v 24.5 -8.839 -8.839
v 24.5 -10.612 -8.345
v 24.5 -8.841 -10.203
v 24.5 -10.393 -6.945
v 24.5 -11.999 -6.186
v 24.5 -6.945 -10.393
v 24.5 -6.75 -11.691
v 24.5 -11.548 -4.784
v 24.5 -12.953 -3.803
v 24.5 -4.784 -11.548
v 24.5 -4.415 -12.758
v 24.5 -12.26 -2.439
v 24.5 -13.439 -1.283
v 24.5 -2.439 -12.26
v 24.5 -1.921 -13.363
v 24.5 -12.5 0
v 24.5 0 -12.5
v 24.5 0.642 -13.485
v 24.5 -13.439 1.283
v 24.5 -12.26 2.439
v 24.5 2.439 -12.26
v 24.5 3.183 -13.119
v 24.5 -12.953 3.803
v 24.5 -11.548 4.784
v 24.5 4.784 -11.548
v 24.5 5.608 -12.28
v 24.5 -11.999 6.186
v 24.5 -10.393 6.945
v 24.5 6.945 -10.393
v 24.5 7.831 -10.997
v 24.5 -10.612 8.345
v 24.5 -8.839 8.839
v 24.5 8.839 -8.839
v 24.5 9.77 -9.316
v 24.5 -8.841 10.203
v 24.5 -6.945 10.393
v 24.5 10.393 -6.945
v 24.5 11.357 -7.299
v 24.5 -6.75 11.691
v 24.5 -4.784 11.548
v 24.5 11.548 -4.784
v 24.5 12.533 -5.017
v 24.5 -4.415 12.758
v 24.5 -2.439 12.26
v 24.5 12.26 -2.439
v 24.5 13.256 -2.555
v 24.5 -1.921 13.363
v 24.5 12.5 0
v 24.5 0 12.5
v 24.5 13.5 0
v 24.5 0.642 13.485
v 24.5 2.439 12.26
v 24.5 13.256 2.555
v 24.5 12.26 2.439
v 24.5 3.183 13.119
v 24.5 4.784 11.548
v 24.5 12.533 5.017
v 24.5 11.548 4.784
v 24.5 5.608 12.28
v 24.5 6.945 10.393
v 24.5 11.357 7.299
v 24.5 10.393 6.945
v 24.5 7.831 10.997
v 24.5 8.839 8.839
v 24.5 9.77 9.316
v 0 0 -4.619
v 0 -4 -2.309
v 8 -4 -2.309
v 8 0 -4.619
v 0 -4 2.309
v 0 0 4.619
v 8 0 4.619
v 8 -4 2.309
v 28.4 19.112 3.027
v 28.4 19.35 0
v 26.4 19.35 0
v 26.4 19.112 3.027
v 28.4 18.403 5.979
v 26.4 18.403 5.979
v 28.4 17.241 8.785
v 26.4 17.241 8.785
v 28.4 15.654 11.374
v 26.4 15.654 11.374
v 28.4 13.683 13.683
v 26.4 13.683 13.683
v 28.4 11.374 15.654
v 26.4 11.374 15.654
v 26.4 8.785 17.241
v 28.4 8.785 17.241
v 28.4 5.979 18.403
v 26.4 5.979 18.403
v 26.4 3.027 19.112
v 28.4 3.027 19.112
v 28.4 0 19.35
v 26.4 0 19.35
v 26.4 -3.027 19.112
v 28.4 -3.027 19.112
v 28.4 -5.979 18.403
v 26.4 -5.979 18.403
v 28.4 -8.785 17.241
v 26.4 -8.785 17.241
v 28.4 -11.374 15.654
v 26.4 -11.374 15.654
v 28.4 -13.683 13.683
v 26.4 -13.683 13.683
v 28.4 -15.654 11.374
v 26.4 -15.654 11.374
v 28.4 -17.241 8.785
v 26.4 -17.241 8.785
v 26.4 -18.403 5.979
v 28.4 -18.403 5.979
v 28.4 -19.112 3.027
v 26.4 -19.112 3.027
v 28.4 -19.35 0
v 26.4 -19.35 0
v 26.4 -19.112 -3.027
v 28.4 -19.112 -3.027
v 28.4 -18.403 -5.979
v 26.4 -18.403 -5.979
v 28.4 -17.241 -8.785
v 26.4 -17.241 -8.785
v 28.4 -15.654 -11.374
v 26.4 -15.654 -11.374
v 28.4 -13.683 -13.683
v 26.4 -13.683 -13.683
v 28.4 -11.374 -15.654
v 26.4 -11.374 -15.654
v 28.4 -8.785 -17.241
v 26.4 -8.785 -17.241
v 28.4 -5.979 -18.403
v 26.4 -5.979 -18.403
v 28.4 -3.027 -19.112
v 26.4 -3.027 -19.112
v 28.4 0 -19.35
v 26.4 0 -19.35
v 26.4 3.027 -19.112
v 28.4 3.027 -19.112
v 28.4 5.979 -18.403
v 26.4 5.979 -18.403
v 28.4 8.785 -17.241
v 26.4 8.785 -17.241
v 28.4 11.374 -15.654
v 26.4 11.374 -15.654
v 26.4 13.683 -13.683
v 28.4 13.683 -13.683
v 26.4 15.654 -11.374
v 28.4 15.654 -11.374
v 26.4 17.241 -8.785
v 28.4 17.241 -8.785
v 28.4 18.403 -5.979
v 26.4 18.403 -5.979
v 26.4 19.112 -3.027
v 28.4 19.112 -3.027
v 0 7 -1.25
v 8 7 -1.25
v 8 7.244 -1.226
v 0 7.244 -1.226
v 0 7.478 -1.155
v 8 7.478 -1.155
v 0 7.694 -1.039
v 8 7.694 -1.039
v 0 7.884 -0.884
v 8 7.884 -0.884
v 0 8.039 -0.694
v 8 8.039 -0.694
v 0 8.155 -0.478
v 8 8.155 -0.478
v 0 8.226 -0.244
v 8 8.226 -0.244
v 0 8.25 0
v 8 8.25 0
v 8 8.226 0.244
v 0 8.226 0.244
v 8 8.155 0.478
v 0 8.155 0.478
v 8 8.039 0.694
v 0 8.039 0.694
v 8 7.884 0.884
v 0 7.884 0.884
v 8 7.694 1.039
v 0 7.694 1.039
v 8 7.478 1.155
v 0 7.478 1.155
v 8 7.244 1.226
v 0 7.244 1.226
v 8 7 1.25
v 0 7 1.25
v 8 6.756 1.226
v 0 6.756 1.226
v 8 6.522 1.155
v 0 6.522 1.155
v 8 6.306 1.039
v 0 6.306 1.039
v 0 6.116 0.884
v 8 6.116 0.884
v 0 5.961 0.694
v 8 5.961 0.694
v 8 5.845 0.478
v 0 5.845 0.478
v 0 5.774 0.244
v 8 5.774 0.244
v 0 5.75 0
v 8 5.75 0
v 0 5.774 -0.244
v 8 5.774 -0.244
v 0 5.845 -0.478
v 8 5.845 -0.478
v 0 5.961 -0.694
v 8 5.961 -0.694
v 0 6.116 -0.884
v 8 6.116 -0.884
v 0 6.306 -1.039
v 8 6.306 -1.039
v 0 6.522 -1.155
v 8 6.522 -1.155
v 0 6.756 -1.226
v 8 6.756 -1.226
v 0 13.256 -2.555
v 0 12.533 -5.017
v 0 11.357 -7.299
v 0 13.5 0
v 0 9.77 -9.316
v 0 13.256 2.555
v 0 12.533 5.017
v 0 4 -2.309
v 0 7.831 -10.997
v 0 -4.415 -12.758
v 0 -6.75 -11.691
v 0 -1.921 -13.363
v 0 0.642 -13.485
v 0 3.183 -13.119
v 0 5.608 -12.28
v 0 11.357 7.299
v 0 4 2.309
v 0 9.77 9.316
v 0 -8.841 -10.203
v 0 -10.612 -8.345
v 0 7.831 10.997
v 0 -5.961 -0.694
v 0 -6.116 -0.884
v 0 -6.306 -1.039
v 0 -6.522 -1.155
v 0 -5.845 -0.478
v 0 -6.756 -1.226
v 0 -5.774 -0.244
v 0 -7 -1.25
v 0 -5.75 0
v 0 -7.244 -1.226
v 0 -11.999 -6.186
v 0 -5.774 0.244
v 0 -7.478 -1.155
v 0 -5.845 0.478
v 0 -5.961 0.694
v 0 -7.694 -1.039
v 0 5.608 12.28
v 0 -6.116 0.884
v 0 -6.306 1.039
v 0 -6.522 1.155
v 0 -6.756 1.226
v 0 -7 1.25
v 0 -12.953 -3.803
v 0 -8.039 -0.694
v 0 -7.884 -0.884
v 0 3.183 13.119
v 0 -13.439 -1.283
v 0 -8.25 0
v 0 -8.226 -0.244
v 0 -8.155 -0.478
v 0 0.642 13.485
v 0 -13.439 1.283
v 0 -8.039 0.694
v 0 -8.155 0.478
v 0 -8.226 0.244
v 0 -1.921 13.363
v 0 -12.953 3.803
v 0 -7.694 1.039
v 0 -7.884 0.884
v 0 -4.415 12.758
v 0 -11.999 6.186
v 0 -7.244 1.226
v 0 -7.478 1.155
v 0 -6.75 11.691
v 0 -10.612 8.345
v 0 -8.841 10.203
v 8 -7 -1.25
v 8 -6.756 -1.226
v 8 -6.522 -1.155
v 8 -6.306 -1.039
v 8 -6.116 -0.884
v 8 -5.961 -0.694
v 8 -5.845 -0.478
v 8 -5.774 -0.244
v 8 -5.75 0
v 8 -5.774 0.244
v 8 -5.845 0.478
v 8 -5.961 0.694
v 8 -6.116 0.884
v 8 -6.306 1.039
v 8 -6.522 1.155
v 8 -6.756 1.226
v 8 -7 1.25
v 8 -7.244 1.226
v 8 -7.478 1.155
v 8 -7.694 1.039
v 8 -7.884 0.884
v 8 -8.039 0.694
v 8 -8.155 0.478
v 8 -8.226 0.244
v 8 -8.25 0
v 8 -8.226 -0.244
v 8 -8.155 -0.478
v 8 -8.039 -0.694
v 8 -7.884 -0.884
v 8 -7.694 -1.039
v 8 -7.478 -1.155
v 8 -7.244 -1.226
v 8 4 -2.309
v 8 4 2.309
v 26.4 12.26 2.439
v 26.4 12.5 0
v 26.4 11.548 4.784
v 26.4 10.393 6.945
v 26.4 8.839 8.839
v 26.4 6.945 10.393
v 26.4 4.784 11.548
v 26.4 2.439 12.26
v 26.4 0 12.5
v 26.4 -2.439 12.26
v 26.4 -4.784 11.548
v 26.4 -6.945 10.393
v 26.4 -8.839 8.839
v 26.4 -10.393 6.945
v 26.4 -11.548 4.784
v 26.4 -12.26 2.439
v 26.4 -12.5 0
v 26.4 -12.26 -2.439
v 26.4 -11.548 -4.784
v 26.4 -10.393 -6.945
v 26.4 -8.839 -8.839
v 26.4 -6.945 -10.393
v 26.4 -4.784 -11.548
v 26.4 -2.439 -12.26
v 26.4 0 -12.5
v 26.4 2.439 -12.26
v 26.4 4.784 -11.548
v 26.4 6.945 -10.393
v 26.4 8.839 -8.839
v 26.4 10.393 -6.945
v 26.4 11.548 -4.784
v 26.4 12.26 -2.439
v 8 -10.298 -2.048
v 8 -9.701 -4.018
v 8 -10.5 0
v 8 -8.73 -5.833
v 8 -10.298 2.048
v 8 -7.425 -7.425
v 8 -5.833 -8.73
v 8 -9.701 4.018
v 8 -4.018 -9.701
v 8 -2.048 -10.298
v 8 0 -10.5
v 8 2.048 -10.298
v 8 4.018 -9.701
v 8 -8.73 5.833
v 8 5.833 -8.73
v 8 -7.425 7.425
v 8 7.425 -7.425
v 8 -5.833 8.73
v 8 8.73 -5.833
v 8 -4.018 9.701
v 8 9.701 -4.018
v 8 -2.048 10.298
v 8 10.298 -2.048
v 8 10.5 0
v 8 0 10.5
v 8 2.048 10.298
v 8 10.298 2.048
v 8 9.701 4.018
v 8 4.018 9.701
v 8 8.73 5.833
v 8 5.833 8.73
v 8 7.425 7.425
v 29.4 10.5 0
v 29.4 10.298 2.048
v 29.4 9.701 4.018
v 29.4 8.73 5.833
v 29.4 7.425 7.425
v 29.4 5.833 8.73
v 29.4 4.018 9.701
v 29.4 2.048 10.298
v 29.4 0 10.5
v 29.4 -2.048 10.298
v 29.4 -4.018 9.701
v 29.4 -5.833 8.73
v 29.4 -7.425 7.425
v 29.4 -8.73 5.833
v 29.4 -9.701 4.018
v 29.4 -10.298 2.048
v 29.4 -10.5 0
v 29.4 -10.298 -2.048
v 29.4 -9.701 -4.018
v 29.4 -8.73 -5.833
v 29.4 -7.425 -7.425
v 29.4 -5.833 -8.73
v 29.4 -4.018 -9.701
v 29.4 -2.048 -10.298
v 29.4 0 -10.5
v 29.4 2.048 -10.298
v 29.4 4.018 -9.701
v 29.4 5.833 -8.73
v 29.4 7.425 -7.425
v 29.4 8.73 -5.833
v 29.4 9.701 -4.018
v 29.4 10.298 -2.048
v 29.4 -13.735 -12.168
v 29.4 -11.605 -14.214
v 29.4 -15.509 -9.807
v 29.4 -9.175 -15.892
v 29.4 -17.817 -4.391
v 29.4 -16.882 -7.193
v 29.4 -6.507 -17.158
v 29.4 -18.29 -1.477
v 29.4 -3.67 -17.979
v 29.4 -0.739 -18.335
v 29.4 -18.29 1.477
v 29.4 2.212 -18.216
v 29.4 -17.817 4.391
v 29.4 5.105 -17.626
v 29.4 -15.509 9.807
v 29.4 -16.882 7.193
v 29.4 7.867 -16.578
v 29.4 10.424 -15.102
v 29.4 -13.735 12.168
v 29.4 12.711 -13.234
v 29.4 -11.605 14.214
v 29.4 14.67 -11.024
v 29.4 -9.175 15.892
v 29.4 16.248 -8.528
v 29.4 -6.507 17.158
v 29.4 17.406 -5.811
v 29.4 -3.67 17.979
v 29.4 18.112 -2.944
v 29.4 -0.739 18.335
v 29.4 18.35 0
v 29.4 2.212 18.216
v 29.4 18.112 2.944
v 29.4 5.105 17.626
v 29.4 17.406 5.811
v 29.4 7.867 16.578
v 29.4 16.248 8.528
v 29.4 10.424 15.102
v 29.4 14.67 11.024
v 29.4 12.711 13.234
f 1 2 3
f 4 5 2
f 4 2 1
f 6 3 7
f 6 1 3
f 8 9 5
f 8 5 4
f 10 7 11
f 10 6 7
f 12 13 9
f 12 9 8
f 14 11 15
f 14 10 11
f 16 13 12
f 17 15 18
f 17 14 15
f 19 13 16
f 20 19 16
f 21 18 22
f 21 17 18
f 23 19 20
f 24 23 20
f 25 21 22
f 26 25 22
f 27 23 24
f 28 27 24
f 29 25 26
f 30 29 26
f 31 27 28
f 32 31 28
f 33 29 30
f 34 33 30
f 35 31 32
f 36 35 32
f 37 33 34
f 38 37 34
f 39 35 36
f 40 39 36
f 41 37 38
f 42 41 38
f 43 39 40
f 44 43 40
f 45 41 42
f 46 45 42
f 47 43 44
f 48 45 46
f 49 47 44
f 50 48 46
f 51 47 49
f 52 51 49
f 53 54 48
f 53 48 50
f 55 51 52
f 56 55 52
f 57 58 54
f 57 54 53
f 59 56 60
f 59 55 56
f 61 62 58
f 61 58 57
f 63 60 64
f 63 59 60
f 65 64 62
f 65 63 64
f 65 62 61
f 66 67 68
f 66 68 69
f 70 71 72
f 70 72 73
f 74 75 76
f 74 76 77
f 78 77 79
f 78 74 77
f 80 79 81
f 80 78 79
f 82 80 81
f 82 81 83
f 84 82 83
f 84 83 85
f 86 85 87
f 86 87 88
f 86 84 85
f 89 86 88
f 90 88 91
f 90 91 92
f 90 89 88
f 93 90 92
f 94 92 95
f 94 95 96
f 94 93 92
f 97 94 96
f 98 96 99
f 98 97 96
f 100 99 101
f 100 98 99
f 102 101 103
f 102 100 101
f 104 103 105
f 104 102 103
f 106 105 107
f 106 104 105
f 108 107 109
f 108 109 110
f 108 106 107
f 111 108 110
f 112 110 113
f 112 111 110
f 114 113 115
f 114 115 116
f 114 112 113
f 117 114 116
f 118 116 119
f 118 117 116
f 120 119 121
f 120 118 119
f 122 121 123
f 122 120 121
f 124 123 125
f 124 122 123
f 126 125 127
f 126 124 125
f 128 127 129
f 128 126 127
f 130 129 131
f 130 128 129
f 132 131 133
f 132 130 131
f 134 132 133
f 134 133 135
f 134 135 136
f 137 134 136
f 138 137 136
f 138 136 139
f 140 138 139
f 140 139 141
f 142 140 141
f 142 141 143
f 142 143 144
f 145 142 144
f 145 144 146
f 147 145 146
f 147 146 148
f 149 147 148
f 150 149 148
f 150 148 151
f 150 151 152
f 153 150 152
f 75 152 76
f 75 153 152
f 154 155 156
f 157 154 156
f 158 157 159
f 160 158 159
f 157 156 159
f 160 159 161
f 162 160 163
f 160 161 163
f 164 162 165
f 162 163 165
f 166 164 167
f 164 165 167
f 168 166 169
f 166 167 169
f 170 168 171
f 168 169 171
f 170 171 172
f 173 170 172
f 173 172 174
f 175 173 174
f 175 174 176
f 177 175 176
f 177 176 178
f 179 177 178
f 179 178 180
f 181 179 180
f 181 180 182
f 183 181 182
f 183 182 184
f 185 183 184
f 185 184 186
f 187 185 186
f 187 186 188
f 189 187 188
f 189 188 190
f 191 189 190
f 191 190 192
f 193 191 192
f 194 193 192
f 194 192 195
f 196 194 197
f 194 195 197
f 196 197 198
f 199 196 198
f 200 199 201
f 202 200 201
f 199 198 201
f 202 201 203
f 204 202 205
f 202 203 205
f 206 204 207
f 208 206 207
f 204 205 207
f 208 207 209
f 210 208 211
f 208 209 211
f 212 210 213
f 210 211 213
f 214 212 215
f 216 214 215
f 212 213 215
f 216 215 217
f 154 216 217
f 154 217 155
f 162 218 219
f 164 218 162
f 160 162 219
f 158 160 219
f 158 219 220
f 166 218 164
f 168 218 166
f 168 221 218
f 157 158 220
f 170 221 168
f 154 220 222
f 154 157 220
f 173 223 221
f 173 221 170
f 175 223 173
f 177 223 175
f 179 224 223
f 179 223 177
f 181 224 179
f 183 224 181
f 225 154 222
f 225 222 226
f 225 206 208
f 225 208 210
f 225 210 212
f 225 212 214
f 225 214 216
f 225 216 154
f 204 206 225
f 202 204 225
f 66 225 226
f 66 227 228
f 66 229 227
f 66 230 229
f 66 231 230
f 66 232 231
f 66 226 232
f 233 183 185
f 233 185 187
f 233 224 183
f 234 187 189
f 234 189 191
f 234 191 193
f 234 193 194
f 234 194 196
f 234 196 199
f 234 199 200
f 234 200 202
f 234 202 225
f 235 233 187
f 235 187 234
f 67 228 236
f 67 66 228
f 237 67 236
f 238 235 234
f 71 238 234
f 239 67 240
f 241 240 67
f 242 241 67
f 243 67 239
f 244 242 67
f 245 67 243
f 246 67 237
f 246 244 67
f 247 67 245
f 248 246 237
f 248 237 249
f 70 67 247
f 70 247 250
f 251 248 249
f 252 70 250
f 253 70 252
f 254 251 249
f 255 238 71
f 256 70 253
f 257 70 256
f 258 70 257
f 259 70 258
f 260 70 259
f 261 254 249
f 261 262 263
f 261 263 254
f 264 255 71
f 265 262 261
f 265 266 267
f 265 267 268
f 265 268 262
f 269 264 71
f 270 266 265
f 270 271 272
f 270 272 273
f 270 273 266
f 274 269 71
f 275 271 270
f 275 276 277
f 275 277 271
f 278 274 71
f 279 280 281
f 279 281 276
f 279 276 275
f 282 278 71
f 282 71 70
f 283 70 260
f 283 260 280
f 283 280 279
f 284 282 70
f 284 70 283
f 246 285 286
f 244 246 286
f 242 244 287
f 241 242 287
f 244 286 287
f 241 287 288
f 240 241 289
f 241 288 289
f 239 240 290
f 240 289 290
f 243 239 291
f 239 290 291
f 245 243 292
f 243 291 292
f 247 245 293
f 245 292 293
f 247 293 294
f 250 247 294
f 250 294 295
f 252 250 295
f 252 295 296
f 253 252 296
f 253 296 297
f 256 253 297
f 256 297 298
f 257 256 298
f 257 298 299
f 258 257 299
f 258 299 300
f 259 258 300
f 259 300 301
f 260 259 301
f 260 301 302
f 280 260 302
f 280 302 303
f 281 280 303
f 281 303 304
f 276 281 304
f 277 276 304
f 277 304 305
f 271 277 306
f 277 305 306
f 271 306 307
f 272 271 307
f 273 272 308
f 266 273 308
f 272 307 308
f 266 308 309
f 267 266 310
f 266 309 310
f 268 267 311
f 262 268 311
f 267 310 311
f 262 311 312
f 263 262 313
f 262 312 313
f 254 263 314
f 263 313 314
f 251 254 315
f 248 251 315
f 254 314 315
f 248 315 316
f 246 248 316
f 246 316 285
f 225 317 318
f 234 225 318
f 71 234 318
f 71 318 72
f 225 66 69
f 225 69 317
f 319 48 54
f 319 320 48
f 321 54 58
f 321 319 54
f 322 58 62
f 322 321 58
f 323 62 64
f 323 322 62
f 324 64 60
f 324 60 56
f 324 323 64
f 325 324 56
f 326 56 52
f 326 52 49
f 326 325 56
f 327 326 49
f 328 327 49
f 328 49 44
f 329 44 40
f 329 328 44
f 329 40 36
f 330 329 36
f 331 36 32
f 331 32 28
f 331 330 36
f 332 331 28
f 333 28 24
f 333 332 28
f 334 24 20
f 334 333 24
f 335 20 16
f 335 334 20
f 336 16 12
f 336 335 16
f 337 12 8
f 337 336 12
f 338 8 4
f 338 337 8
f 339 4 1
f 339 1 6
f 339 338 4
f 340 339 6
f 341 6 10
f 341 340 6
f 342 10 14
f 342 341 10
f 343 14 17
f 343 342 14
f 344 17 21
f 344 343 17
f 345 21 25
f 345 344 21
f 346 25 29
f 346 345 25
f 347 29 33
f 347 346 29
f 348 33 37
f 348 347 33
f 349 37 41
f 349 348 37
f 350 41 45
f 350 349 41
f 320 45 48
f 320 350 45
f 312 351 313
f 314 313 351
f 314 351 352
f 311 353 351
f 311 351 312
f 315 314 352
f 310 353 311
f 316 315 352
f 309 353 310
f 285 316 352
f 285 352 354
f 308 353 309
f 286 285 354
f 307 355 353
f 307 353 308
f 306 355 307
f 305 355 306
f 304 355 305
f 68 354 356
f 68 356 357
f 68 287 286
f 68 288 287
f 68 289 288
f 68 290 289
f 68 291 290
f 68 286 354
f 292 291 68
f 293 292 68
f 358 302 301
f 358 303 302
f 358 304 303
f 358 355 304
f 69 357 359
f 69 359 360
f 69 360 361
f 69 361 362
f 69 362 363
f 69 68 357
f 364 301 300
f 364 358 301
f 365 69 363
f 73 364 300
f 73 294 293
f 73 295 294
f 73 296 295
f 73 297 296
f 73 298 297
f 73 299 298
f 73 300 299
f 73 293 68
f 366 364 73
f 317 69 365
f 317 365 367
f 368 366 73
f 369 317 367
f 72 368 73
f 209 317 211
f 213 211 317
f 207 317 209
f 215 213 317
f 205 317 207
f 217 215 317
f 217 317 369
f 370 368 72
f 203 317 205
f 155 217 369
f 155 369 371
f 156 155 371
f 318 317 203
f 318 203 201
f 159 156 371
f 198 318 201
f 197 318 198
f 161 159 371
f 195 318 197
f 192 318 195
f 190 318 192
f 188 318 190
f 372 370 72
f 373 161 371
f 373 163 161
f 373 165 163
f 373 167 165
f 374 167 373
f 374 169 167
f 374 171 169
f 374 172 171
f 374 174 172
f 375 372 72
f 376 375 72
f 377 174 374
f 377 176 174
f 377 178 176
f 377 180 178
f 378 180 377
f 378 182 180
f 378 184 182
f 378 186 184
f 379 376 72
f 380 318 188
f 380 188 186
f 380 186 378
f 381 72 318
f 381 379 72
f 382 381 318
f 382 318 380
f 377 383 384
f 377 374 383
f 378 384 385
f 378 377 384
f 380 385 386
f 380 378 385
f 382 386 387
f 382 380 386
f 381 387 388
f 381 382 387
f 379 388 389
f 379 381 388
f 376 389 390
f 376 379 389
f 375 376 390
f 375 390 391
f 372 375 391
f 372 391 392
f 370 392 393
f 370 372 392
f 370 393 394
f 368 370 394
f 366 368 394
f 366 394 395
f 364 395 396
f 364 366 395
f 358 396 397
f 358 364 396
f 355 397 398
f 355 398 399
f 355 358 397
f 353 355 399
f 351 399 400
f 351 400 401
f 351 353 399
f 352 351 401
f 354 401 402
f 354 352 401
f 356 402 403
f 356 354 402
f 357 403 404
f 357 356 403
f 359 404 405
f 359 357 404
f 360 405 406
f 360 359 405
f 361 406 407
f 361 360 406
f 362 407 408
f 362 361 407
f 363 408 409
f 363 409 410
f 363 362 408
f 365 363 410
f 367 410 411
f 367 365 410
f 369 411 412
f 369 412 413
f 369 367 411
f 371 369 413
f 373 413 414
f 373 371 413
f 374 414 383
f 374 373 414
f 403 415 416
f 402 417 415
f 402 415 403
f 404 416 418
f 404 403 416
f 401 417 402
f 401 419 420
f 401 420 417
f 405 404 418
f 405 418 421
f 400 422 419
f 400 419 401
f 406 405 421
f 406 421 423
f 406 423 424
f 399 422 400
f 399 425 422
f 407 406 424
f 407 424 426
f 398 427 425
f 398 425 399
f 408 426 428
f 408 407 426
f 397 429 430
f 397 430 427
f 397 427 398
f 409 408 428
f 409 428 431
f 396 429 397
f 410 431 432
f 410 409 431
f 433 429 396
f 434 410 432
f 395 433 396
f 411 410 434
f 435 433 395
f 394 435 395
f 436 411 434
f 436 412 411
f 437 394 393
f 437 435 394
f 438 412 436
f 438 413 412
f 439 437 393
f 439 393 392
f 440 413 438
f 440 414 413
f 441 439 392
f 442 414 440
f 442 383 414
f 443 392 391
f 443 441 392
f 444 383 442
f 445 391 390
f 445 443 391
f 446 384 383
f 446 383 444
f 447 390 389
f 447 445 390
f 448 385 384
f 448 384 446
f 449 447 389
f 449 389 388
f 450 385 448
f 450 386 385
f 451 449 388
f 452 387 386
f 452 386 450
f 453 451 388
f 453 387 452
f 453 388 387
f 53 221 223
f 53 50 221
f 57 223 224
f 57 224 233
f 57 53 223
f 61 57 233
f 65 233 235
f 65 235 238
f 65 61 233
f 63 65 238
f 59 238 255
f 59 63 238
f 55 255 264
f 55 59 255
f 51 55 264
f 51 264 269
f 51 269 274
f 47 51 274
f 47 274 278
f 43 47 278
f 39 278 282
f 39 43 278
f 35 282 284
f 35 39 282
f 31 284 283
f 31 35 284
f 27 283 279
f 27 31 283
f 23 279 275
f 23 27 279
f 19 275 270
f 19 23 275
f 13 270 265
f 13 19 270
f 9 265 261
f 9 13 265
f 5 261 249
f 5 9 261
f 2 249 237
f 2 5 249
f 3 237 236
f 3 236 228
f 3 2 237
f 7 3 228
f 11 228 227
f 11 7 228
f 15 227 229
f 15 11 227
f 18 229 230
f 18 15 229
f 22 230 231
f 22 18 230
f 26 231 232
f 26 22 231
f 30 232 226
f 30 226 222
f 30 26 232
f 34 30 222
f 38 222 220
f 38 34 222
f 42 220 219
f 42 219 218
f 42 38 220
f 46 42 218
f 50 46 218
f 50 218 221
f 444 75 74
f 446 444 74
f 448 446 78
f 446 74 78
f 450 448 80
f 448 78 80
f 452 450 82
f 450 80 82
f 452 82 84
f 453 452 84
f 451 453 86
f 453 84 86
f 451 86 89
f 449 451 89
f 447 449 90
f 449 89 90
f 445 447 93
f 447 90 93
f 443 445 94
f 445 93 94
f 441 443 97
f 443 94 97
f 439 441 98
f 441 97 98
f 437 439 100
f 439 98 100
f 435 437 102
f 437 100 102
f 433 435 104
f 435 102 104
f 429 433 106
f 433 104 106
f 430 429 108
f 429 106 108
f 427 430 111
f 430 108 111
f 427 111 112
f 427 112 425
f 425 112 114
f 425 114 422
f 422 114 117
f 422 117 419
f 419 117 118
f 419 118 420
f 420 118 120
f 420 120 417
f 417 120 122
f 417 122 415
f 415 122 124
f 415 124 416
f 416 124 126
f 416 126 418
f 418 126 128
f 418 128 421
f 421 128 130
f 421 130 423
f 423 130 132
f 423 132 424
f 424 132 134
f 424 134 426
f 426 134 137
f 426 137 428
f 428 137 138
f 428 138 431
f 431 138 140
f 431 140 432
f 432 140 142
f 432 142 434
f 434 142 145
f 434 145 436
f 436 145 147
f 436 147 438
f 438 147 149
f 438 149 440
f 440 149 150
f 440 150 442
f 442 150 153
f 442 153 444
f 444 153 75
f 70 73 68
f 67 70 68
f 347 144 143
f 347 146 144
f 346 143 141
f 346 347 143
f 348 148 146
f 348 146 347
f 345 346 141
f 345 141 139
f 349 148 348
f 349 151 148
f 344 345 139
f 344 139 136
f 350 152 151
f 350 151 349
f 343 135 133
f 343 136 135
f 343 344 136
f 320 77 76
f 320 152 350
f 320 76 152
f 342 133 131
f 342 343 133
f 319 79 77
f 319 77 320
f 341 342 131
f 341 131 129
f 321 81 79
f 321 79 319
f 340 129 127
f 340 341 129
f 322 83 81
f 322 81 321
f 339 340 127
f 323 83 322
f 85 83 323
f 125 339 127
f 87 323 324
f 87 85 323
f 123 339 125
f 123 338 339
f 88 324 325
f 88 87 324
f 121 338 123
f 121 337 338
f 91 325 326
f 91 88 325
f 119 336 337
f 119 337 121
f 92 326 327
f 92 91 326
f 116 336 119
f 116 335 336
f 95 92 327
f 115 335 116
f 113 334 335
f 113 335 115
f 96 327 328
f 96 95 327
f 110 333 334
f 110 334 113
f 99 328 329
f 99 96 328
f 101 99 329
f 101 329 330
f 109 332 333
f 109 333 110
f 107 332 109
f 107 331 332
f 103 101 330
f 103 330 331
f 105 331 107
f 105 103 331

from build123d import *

# Parameters (mm, degrees)
CUT_EXTRUDE_1_DEPTH = 30.4
CHAMFER_1_SIZE      = 1
SKETCH_3_R          = 1.25
CUT_EXTRUDE_2_DEPTH = 30.4


with BuildPart() as part:
    # 草图1 → 旋转1 (revolve)
    with BuildSketch(Plane.XY):
        Polygon((29.4, 19.35), (29.4, 10.5), (8, 10.5), (8, 0), (0, 0), (0, 13.5), (24.5, 13.5), (24.5, 12.5), (26.4, 12.5), (26.4, 19.35), align=None)
    revolve(axis=Axis((0, 0, 0), (1, 0, 0)))

    # 草图2 → 切除-拉伸1 (cut, through all)
    with BuildSketch(Plane(origin=(29.4, 0, 0), x_dir=(0, 0, -1), z_dir=(1, 0, 0))):
        Polygon((-2.309401077, 4), (-4.618802154, 0), (-2.309401077, -4), (2.309401077, -4), (4.618802154, 0), (2.309401077, 4), align=None)
    extrude(amount=-CUT_EXTRUDE_1_DEPTH, mode=Mode.SUBTRACT)

    # 倒角1
    chamfer_1_edges = [part.edges().sort_by_distance(p)[0] for p in [
        (29.4, -19.35, 0),
    ]]
    chamfer(chamfer_1_edges, length=CHAMFER_1_SIZE)

    # 草图3 → 切除-拉伸2 (cut, through all)
    with BuildSketch(Plane(origin=(29.4, 0, 0), x_dir=(0, 0, -1), z_dir=(1, 0, 0))):
        with Locations((0, 7)):
            Circle(SKETCH_3_R)
        with Locations((0, -7)):
            Circle(SKETCH_3_R)
    extrude(amount=-CUT_EXTRUDE_2_DEPTH, mode=Mode.SUBTRACT)


solid = part.part
